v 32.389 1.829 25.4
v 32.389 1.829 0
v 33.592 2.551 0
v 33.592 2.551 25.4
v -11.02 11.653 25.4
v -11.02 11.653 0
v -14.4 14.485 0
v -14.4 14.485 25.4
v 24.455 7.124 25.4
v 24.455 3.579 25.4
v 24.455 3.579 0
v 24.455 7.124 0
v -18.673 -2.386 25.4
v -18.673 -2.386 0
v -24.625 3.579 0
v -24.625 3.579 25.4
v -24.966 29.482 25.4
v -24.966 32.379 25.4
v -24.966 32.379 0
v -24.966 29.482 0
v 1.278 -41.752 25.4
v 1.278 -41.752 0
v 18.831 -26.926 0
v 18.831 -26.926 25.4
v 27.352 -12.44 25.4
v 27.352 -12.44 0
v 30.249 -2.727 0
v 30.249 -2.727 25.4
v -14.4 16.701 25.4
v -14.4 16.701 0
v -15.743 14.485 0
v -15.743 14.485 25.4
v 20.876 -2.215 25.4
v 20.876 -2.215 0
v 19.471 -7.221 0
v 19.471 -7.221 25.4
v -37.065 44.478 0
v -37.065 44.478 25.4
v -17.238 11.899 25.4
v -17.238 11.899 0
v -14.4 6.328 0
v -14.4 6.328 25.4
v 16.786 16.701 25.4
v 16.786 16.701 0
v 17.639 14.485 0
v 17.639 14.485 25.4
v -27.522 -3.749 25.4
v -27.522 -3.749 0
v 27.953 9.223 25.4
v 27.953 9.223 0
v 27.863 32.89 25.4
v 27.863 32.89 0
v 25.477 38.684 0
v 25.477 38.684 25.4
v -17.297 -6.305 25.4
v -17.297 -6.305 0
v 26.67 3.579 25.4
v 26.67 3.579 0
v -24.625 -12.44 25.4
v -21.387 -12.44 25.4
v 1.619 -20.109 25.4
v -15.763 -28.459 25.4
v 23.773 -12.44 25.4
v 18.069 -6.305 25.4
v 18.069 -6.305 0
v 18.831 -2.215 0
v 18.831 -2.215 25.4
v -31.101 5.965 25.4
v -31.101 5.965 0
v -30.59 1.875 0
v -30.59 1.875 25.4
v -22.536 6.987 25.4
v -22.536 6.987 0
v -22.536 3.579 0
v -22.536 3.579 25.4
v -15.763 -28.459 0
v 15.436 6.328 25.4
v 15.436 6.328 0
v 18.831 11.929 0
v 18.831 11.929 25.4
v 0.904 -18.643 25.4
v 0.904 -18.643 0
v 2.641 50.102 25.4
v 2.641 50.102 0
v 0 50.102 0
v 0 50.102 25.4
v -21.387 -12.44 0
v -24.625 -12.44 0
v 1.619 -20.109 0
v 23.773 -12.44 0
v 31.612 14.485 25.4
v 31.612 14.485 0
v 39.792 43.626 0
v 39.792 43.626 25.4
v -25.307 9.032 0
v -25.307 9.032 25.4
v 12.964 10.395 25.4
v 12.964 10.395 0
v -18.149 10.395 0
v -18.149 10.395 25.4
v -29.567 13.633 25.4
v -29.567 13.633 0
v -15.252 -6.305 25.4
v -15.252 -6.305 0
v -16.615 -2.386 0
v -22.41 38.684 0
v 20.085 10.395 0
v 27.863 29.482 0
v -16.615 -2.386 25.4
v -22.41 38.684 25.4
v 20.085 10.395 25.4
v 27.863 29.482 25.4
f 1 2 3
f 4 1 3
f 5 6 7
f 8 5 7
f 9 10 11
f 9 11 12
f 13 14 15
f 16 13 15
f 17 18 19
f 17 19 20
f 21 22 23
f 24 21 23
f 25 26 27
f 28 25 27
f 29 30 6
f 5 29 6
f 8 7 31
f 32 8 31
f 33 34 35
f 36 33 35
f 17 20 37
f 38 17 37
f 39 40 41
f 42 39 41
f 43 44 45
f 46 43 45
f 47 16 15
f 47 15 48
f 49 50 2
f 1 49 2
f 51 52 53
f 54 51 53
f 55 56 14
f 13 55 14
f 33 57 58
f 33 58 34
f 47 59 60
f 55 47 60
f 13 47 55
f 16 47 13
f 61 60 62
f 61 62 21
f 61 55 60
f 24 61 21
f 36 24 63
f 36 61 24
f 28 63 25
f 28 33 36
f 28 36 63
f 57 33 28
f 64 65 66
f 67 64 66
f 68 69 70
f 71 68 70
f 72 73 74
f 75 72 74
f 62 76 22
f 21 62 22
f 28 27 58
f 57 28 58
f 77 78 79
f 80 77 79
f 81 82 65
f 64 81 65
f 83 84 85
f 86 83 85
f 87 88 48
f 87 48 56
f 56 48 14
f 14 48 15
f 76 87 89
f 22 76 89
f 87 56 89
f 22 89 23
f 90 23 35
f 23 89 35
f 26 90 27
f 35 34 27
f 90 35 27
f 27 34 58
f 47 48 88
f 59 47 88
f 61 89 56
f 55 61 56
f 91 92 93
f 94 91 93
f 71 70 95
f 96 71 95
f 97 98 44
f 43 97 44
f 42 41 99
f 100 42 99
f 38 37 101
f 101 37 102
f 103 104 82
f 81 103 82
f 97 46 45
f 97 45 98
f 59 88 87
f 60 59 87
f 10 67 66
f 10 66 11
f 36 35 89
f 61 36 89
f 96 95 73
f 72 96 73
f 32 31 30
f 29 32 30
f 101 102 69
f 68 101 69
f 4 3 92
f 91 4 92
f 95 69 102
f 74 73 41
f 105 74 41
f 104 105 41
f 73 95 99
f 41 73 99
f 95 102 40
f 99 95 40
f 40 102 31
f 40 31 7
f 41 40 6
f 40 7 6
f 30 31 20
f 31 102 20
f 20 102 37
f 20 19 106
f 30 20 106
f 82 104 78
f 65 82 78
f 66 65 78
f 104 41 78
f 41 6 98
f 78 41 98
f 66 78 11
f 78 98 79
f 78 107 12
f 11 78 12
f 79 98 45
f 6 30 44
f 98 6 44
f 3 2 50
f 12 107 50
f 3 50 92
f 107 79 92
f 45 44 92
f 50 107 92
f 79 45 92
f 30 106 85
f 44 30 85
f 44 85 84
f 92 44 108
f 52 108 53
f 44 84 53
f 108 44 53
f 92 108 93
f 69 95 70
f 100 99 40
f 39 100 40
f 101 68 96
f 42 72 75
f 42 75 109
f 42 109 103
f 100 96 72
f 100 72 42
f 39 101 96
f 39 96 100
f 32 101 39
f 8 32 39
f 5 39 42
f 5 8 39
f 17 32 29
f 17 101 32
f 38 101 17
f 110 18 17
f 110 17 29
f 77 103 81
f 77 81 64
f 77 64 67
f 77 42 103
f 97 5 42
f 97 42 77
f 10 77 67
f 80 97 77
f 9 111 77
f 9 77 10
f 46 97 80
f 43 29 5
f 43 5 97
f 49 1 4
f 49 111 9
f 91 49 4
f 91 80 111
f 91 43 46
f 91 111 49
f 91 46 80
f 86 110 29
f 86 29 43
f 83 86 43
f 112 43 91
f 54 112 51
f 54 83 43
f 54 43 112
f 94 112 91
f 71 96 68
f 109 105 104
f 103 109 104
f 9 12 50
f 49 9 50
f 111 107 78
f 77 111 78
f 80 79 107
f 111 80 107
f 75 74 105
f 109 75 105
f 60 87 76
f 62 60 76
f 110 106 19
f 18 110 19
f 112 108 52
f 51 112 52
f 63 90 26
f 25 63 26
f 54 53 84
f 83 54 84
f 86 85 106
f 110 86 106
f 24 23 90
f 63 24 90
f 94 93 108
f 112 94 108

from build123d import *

# Parameters (mm, degrees)
F1_DEPTH = 25.4


with BuildPart() as f1:
    # F0 (on Top) → F1 (new body)
    with BuildSketch(Plane.XY):
        Polygon((-27.522078, -3.749137), (-24.625016, -12.440319), (-21.387124, -12.440319), (-15.763419, -28.459361), (1.278116, -41.751757), (18.830895, -26.925623), (23.77294, -12.440319), (27.351663, -12.440319), (30.248724, -2.726645), (26.670001, 3.578722), (20.875881, -2.215399), (19.470939, -7.220506), (1.618946, -20.109011), (-17.297156, -6.305368), (-18.673169, -2.385815), (-24.625016, 3.578722), align=None)
        Polygon((0, -12.474165), (-22.53563, 6.986716), (-22.53563, 3.578722), (-16.615495, -2.385815), (-15.252173, -6.305368), (0.903641, -18.642962), (18.06899, -6.305368), (18.830895, -2.215399), (24.454599, 3.578722), (24.454599, 7.123598), align=None)
        Polygon((-28.203737, 18.575272), (-29.567061, 13.633227), (-31.100798, 5.964537), (-30.589553, 1.874569), (-25.306677, 9.032013), (-22.53563, 6.986716), (0, -12.474165), (24.454599, 7.123598), (27.953023, 9.222652), (32.388937, 1.829458), (33.591868, 2.551216), (31.612046, 14.485304), (30.419139, 19.086517), (23.77294, 25.732715), (17.297158, 22.153994), (1.448531, 41.24051), (-14.400096, 22.324407), (-20.023802, 25.732715), align=None)
        Polygon((-14.400096, 6.328176), (-18.149232, 10.395336), (-17.238215, 11.898515), align=None, mode=Mode.SUBTRACT)
        Polygon((-11.020094, 11.653411), (-14.400096, 14.485304), (-15.742762, 14.485304), (-14.400096, 16.700704), align=None, mode=Mode.SUBTRACT)
        Polygon((15.436412, 6.328176), (18.830895, 11.929073), (20.084595, 10.395336), align=None, mode=Mode.SUBTRACT)
        Polygon((12.964475, 10.395336), (16.78591, 16.700704), (17.638725, 14.485304), align=None, mode=Mode.SUBTRACT)
        Polygon((-24.965847, 29.481854), (-37.065335, 44.478402), (-29.567061, 13.633227), (-28.203737, 18.575272), (-20.023802, 25.732715), (-14.400096, 22.324407), (1.448531, 41.24051), (17.297158, 22.153994), (23.77294, 25.732715), (30.419139, 19.086517), (31.612046, 14.485304), (39.791983, 43.626327), (27.862908, 29.481854), (27.862908, 32.89016), (25.477091, 38.684282), (2.641438, 50.102107), (0, 50.102107), (-22.409616, 38.684282), (-24.965847, 32.378912), align=None)
    extrude(amount=F1_DEPTH)


solid = f1.part
